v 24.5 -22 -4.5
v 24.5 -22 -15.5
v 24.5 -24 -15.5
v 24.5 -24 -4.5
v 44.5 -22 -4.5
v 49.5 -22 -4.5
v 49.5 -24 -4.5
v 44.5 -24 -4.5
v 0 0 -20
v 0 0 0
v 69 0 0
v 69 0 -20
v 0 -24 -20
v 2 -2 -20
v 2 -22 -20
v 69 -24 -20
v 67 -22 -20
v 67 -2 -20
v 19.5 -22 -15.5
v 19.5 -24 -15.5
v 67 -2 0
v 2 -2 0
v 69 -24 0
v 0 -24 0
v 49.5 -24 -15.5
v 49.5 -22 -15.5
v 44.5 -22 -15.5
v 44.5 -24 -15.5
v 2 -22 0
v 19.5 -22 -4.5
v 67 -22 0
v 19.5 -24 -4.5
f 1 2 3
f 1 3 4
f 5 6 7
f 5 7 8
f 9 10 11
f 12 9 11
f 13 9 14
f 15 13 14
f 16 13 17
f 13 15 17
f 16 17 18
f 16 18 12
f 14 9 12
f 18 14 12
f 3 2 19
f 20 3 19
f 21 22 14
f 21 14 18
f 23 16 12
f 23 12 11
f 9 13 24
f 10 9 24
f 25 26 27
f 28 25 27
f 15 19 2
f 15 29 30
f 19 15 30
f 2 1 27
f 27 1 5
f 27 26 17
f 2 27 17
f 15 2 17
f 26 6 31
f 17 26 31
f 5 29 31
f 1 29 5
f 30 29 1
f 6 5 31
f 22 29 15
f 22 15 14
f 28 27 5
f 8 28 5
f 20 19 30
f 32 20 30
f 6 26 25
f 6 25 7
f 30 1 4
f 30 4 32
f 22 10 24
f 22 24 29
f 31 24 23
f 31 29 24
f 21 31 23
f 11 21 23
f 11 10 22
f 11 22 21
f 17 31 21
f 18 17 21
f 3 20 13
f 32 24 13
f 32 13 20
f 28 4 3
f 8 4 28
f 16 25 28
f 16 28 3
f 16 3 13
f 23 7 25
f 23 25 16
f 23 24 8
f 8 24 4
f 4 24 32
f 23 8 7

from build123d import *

# Parameters (mm, degrees)
F0_W     = 69
F0_H     = 20
F1_DEPTH = 24
F2_W     = 65
F2_H     = 20
F3_DEPTH = 20
F5_W     = 5
F5_H     = 11
F6_DEPTH = 5


with BuildPart() as f1:
    # F0 (on Front) → F1 (new body)
    with BuildSketch(Plane.XZ):
        with Locations((34.5, -10)):
            Rectangle(F0_W, F0_H)
    extrude(amount=F1_DEPTH)

    # F2 (on Top) → F3 (cut, symmetric)
    with BuildSketch(Plane.XY):
        with Locations((34.5, -12)):
            Rectangle(F2_W, F2_H)
    extrude(amount=F3_DEPTH, both=True, mode=Mode.SUBTRACT)

    # F5 (on offset) → F6 (cut)
    with BuildSketch(Plane(origin=(0, -22, 0), x_dir=(-1, 0, 0), z_dir=(0, 1, 0))):
        with Locations((-22, -10)):
            Rectangle(F5_W, F5_H)
        with Locations((-47, -9.9999997467)):
            Rectangle(F5_W, F5_H)
    extrude(amount=-F6_DEPTH, mode=Mode.SUBTRACT)


solid = f1.part
